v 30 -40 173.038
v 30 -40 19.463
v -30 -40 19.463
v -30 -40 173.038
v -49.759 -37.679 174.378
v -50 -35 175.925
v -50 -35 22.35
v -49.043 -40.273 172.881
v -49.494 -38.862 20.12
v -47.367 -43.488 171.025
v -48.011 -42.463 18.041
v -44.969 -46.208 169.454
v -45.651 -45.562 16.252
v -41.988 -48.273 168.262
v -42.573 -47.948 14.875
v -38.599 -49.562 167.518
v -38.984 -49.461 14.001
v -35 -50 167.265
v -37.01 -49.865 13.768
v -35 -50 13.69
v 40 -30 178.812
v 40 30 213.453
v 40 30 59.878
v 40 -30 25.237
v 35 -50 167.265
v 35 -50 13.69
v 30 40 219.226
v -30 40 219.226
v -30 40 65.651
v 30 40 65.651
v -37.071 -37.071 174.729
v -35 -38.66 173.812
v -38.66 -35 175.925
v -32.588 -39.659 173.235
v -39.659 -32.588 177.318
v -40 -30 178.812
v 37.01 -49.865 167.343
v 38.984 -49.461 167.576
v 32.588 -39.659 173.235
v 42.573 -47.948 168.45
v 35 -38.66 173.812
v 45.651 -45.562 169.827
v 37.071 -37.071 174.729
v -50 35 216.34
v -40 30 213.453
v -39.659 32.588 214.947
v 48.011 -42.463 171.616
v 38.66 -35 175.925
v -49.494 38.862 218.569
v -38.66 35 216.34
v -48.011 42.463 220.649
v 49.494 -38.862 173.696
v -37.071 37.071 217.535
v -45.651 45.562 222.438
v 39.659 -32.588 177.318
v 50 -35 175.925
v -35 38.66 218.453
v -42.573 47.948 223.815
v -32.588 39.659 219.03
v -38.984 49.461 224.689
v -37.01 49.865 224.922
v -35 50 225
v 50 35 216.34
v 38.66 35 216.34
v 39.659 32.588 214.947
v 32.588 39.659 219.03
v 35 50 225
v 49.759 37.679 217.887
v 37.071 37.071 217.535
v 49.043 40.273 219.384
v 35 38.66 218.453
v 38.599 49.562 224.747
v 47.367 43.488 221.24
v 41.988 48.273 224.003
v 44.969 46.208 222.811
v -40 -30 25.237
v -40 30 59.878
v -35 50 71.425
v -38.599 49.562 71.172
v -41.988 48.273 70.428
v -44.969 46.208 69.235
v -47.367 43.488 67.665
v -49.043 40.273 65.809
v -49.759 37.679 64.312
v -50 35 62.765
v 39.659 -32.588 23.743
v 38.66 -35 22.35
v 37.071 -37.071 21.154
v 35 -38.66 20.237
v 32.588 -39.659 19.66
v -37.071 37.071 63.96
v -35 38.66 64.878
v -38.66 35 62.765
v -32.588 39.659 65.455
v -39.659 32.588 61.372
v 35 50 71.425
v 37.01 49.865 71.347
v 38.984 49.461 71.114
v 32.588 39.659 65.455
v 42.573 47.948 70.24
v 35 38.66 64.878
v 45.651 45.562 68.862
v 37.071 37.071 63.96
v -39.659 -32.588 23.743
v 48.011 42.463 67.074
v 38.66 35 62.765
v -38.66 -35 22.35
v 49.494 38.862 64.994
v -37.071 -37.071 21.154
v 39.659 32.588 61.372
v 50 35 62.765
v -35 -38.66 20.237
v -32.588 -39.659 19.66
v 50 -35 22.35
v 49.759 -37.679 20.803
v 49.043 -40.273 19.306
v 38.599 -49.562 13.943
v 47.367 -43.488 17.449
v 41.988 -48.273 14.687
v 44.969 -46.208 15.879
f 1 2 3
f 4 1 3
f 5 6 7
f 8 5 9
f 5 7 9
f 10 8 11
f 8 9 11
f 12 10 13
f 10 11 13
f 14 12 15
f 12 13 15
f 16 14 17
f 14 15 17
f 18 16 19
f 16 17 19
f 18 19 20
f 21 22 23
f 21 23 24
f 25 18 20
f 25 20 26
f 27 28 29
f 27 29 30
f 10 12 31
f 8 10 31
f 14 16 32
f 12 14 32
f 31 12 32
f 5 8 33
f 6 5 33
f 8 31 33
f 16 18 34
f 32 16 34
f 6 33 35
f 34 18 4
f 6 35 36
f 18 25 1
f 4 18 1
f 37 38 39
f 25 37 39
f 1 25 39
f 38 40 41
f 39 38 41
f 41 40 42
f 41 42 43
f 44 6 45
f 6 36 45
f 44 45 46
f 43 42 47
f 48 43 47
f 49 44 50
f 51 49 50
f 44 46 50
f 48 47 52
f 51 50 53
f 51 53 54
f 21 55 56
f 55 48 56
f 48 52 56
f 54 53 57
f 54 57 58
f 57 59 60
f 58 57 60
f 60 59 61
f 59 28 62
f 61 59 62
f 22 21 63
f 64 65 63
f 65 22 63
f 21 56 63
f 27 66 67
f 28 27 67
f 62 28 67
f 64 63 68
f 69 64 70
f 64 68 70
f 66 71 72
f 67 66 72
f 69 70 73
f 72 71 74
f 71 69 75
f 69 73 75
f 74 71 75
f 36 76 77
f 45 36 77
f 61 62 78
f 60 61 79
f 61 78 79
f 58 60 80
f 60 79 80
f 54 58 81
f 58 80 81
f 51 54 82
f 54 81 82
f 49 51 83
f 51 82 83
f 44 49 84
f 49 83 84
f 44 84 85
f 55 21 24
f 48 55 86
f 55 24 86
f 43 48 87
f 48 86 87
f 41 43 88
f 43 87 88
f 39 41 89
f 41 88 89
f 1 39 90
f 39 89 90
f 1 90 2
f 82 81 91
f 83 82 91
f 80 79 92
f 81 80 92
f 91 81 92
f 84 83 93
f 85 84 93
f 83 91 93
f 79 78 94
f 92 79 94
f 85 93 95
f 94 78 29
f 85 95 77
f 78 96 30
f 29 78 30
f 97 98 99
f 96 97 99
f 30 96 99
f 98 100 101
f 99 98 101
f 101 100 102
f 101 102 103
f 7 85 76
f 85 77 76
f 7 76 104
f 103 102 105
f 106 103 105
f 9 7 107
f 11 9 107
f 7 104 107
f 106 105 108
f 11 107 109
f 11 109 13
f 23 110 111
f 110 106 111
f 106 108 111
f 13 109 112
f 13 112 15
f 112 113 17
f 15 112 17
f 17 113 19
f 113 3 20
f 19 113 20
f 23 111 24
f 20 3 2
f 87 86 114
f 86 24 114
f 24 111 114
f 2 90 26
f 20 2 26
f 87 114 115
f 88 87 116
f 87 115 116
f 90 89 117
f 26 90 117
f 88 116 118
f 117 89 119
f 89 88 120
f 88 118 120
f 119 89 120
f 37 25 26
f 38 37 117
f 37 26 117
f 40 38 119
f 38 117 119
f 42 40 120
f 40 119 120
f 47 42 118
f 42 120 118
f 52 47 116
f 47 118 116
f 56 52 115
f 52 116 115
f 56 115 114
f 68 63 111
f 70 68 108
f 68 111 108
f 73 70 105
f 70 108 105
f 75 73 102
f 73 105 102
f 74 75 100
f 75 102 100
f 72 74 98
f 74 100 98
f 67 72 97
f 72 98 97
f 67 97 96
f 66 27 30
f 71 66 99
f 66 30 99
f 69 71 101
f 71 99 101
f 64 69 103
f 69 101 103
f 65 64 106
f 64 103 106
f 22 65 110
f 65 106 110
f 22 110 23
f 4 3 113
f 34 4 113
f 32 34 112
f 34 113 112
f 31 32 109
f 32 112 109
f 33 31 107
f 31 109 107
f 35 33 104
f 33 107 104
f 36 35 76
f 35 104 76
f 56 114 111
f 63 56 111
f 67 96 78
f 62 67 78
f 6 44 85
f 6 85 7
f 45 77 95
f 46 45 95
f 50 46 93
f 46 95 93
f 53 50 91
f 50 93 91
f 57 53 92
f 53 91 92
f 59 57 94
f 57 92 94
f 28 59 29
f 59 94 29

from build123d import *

# Parameters (mm, degrees)
F1_DEPTH = 225
F3_DEPTH = 100


with BuildPart() as f1:
    # F0 (on Top) → F1 (new body)
    with BuildSketch(Plane.XY):
        with BuildLine():
            Line((35, 50), (-35, 50))
            ThreePointArc((-35, 50), (-45.606602, 45.606602), (-50, 35))
            Line((-50, 35), (-50, -35))
            ThreePointArc((-50, -35), (-45.606602, -45.606602), (-35, -50))
            Line((-35, -50), (35, -50))
            ThreePointArc((35, -50), (45.606602, -45.606602), (50, -35))
            Line((50, -35), (50, 35))
            ThreePointArc((50, 35), (45.606602, 45.606602), (35, 50))
        make_face()
        with BuildLine():
            ThreePointArc((-40, 30), (-37.071068, 37.071068), (-30, 40))
            Line((-30, 40), (30, 40))
            ThreePointArc((30, 40), (37.071068, 37.071068), (40, 30))
            Line((40, 30), (40, -30))
            ThreePointArc((40, -30), (37.071068, -37.071068), (30, -40))
            Line((30, -40), (-30, -40))
            ThreePointArc((-30, -40), (-37.071068, -37.071068), (-40, -30))
            Line((-40, -30), (-40, 30))
        make_face(mode=Mode.SUBTRACT)
    extrude(amount=F1_DEPTH)

    # F2 (on face) → F3 (cut)
    with BuildSketch(Plane.YZ.offset(50)):
        Polygon((-50, 225), (-50, 167.264973), (50, 225), align=None)
        Polygon((50, 71.424828), (-50, 13.689801), (-50, 0), (50, 0), align=None)
    extrude(amount=-F3_DEPTH, mode=Mode.SUBTRACT)


solid = f1.part
